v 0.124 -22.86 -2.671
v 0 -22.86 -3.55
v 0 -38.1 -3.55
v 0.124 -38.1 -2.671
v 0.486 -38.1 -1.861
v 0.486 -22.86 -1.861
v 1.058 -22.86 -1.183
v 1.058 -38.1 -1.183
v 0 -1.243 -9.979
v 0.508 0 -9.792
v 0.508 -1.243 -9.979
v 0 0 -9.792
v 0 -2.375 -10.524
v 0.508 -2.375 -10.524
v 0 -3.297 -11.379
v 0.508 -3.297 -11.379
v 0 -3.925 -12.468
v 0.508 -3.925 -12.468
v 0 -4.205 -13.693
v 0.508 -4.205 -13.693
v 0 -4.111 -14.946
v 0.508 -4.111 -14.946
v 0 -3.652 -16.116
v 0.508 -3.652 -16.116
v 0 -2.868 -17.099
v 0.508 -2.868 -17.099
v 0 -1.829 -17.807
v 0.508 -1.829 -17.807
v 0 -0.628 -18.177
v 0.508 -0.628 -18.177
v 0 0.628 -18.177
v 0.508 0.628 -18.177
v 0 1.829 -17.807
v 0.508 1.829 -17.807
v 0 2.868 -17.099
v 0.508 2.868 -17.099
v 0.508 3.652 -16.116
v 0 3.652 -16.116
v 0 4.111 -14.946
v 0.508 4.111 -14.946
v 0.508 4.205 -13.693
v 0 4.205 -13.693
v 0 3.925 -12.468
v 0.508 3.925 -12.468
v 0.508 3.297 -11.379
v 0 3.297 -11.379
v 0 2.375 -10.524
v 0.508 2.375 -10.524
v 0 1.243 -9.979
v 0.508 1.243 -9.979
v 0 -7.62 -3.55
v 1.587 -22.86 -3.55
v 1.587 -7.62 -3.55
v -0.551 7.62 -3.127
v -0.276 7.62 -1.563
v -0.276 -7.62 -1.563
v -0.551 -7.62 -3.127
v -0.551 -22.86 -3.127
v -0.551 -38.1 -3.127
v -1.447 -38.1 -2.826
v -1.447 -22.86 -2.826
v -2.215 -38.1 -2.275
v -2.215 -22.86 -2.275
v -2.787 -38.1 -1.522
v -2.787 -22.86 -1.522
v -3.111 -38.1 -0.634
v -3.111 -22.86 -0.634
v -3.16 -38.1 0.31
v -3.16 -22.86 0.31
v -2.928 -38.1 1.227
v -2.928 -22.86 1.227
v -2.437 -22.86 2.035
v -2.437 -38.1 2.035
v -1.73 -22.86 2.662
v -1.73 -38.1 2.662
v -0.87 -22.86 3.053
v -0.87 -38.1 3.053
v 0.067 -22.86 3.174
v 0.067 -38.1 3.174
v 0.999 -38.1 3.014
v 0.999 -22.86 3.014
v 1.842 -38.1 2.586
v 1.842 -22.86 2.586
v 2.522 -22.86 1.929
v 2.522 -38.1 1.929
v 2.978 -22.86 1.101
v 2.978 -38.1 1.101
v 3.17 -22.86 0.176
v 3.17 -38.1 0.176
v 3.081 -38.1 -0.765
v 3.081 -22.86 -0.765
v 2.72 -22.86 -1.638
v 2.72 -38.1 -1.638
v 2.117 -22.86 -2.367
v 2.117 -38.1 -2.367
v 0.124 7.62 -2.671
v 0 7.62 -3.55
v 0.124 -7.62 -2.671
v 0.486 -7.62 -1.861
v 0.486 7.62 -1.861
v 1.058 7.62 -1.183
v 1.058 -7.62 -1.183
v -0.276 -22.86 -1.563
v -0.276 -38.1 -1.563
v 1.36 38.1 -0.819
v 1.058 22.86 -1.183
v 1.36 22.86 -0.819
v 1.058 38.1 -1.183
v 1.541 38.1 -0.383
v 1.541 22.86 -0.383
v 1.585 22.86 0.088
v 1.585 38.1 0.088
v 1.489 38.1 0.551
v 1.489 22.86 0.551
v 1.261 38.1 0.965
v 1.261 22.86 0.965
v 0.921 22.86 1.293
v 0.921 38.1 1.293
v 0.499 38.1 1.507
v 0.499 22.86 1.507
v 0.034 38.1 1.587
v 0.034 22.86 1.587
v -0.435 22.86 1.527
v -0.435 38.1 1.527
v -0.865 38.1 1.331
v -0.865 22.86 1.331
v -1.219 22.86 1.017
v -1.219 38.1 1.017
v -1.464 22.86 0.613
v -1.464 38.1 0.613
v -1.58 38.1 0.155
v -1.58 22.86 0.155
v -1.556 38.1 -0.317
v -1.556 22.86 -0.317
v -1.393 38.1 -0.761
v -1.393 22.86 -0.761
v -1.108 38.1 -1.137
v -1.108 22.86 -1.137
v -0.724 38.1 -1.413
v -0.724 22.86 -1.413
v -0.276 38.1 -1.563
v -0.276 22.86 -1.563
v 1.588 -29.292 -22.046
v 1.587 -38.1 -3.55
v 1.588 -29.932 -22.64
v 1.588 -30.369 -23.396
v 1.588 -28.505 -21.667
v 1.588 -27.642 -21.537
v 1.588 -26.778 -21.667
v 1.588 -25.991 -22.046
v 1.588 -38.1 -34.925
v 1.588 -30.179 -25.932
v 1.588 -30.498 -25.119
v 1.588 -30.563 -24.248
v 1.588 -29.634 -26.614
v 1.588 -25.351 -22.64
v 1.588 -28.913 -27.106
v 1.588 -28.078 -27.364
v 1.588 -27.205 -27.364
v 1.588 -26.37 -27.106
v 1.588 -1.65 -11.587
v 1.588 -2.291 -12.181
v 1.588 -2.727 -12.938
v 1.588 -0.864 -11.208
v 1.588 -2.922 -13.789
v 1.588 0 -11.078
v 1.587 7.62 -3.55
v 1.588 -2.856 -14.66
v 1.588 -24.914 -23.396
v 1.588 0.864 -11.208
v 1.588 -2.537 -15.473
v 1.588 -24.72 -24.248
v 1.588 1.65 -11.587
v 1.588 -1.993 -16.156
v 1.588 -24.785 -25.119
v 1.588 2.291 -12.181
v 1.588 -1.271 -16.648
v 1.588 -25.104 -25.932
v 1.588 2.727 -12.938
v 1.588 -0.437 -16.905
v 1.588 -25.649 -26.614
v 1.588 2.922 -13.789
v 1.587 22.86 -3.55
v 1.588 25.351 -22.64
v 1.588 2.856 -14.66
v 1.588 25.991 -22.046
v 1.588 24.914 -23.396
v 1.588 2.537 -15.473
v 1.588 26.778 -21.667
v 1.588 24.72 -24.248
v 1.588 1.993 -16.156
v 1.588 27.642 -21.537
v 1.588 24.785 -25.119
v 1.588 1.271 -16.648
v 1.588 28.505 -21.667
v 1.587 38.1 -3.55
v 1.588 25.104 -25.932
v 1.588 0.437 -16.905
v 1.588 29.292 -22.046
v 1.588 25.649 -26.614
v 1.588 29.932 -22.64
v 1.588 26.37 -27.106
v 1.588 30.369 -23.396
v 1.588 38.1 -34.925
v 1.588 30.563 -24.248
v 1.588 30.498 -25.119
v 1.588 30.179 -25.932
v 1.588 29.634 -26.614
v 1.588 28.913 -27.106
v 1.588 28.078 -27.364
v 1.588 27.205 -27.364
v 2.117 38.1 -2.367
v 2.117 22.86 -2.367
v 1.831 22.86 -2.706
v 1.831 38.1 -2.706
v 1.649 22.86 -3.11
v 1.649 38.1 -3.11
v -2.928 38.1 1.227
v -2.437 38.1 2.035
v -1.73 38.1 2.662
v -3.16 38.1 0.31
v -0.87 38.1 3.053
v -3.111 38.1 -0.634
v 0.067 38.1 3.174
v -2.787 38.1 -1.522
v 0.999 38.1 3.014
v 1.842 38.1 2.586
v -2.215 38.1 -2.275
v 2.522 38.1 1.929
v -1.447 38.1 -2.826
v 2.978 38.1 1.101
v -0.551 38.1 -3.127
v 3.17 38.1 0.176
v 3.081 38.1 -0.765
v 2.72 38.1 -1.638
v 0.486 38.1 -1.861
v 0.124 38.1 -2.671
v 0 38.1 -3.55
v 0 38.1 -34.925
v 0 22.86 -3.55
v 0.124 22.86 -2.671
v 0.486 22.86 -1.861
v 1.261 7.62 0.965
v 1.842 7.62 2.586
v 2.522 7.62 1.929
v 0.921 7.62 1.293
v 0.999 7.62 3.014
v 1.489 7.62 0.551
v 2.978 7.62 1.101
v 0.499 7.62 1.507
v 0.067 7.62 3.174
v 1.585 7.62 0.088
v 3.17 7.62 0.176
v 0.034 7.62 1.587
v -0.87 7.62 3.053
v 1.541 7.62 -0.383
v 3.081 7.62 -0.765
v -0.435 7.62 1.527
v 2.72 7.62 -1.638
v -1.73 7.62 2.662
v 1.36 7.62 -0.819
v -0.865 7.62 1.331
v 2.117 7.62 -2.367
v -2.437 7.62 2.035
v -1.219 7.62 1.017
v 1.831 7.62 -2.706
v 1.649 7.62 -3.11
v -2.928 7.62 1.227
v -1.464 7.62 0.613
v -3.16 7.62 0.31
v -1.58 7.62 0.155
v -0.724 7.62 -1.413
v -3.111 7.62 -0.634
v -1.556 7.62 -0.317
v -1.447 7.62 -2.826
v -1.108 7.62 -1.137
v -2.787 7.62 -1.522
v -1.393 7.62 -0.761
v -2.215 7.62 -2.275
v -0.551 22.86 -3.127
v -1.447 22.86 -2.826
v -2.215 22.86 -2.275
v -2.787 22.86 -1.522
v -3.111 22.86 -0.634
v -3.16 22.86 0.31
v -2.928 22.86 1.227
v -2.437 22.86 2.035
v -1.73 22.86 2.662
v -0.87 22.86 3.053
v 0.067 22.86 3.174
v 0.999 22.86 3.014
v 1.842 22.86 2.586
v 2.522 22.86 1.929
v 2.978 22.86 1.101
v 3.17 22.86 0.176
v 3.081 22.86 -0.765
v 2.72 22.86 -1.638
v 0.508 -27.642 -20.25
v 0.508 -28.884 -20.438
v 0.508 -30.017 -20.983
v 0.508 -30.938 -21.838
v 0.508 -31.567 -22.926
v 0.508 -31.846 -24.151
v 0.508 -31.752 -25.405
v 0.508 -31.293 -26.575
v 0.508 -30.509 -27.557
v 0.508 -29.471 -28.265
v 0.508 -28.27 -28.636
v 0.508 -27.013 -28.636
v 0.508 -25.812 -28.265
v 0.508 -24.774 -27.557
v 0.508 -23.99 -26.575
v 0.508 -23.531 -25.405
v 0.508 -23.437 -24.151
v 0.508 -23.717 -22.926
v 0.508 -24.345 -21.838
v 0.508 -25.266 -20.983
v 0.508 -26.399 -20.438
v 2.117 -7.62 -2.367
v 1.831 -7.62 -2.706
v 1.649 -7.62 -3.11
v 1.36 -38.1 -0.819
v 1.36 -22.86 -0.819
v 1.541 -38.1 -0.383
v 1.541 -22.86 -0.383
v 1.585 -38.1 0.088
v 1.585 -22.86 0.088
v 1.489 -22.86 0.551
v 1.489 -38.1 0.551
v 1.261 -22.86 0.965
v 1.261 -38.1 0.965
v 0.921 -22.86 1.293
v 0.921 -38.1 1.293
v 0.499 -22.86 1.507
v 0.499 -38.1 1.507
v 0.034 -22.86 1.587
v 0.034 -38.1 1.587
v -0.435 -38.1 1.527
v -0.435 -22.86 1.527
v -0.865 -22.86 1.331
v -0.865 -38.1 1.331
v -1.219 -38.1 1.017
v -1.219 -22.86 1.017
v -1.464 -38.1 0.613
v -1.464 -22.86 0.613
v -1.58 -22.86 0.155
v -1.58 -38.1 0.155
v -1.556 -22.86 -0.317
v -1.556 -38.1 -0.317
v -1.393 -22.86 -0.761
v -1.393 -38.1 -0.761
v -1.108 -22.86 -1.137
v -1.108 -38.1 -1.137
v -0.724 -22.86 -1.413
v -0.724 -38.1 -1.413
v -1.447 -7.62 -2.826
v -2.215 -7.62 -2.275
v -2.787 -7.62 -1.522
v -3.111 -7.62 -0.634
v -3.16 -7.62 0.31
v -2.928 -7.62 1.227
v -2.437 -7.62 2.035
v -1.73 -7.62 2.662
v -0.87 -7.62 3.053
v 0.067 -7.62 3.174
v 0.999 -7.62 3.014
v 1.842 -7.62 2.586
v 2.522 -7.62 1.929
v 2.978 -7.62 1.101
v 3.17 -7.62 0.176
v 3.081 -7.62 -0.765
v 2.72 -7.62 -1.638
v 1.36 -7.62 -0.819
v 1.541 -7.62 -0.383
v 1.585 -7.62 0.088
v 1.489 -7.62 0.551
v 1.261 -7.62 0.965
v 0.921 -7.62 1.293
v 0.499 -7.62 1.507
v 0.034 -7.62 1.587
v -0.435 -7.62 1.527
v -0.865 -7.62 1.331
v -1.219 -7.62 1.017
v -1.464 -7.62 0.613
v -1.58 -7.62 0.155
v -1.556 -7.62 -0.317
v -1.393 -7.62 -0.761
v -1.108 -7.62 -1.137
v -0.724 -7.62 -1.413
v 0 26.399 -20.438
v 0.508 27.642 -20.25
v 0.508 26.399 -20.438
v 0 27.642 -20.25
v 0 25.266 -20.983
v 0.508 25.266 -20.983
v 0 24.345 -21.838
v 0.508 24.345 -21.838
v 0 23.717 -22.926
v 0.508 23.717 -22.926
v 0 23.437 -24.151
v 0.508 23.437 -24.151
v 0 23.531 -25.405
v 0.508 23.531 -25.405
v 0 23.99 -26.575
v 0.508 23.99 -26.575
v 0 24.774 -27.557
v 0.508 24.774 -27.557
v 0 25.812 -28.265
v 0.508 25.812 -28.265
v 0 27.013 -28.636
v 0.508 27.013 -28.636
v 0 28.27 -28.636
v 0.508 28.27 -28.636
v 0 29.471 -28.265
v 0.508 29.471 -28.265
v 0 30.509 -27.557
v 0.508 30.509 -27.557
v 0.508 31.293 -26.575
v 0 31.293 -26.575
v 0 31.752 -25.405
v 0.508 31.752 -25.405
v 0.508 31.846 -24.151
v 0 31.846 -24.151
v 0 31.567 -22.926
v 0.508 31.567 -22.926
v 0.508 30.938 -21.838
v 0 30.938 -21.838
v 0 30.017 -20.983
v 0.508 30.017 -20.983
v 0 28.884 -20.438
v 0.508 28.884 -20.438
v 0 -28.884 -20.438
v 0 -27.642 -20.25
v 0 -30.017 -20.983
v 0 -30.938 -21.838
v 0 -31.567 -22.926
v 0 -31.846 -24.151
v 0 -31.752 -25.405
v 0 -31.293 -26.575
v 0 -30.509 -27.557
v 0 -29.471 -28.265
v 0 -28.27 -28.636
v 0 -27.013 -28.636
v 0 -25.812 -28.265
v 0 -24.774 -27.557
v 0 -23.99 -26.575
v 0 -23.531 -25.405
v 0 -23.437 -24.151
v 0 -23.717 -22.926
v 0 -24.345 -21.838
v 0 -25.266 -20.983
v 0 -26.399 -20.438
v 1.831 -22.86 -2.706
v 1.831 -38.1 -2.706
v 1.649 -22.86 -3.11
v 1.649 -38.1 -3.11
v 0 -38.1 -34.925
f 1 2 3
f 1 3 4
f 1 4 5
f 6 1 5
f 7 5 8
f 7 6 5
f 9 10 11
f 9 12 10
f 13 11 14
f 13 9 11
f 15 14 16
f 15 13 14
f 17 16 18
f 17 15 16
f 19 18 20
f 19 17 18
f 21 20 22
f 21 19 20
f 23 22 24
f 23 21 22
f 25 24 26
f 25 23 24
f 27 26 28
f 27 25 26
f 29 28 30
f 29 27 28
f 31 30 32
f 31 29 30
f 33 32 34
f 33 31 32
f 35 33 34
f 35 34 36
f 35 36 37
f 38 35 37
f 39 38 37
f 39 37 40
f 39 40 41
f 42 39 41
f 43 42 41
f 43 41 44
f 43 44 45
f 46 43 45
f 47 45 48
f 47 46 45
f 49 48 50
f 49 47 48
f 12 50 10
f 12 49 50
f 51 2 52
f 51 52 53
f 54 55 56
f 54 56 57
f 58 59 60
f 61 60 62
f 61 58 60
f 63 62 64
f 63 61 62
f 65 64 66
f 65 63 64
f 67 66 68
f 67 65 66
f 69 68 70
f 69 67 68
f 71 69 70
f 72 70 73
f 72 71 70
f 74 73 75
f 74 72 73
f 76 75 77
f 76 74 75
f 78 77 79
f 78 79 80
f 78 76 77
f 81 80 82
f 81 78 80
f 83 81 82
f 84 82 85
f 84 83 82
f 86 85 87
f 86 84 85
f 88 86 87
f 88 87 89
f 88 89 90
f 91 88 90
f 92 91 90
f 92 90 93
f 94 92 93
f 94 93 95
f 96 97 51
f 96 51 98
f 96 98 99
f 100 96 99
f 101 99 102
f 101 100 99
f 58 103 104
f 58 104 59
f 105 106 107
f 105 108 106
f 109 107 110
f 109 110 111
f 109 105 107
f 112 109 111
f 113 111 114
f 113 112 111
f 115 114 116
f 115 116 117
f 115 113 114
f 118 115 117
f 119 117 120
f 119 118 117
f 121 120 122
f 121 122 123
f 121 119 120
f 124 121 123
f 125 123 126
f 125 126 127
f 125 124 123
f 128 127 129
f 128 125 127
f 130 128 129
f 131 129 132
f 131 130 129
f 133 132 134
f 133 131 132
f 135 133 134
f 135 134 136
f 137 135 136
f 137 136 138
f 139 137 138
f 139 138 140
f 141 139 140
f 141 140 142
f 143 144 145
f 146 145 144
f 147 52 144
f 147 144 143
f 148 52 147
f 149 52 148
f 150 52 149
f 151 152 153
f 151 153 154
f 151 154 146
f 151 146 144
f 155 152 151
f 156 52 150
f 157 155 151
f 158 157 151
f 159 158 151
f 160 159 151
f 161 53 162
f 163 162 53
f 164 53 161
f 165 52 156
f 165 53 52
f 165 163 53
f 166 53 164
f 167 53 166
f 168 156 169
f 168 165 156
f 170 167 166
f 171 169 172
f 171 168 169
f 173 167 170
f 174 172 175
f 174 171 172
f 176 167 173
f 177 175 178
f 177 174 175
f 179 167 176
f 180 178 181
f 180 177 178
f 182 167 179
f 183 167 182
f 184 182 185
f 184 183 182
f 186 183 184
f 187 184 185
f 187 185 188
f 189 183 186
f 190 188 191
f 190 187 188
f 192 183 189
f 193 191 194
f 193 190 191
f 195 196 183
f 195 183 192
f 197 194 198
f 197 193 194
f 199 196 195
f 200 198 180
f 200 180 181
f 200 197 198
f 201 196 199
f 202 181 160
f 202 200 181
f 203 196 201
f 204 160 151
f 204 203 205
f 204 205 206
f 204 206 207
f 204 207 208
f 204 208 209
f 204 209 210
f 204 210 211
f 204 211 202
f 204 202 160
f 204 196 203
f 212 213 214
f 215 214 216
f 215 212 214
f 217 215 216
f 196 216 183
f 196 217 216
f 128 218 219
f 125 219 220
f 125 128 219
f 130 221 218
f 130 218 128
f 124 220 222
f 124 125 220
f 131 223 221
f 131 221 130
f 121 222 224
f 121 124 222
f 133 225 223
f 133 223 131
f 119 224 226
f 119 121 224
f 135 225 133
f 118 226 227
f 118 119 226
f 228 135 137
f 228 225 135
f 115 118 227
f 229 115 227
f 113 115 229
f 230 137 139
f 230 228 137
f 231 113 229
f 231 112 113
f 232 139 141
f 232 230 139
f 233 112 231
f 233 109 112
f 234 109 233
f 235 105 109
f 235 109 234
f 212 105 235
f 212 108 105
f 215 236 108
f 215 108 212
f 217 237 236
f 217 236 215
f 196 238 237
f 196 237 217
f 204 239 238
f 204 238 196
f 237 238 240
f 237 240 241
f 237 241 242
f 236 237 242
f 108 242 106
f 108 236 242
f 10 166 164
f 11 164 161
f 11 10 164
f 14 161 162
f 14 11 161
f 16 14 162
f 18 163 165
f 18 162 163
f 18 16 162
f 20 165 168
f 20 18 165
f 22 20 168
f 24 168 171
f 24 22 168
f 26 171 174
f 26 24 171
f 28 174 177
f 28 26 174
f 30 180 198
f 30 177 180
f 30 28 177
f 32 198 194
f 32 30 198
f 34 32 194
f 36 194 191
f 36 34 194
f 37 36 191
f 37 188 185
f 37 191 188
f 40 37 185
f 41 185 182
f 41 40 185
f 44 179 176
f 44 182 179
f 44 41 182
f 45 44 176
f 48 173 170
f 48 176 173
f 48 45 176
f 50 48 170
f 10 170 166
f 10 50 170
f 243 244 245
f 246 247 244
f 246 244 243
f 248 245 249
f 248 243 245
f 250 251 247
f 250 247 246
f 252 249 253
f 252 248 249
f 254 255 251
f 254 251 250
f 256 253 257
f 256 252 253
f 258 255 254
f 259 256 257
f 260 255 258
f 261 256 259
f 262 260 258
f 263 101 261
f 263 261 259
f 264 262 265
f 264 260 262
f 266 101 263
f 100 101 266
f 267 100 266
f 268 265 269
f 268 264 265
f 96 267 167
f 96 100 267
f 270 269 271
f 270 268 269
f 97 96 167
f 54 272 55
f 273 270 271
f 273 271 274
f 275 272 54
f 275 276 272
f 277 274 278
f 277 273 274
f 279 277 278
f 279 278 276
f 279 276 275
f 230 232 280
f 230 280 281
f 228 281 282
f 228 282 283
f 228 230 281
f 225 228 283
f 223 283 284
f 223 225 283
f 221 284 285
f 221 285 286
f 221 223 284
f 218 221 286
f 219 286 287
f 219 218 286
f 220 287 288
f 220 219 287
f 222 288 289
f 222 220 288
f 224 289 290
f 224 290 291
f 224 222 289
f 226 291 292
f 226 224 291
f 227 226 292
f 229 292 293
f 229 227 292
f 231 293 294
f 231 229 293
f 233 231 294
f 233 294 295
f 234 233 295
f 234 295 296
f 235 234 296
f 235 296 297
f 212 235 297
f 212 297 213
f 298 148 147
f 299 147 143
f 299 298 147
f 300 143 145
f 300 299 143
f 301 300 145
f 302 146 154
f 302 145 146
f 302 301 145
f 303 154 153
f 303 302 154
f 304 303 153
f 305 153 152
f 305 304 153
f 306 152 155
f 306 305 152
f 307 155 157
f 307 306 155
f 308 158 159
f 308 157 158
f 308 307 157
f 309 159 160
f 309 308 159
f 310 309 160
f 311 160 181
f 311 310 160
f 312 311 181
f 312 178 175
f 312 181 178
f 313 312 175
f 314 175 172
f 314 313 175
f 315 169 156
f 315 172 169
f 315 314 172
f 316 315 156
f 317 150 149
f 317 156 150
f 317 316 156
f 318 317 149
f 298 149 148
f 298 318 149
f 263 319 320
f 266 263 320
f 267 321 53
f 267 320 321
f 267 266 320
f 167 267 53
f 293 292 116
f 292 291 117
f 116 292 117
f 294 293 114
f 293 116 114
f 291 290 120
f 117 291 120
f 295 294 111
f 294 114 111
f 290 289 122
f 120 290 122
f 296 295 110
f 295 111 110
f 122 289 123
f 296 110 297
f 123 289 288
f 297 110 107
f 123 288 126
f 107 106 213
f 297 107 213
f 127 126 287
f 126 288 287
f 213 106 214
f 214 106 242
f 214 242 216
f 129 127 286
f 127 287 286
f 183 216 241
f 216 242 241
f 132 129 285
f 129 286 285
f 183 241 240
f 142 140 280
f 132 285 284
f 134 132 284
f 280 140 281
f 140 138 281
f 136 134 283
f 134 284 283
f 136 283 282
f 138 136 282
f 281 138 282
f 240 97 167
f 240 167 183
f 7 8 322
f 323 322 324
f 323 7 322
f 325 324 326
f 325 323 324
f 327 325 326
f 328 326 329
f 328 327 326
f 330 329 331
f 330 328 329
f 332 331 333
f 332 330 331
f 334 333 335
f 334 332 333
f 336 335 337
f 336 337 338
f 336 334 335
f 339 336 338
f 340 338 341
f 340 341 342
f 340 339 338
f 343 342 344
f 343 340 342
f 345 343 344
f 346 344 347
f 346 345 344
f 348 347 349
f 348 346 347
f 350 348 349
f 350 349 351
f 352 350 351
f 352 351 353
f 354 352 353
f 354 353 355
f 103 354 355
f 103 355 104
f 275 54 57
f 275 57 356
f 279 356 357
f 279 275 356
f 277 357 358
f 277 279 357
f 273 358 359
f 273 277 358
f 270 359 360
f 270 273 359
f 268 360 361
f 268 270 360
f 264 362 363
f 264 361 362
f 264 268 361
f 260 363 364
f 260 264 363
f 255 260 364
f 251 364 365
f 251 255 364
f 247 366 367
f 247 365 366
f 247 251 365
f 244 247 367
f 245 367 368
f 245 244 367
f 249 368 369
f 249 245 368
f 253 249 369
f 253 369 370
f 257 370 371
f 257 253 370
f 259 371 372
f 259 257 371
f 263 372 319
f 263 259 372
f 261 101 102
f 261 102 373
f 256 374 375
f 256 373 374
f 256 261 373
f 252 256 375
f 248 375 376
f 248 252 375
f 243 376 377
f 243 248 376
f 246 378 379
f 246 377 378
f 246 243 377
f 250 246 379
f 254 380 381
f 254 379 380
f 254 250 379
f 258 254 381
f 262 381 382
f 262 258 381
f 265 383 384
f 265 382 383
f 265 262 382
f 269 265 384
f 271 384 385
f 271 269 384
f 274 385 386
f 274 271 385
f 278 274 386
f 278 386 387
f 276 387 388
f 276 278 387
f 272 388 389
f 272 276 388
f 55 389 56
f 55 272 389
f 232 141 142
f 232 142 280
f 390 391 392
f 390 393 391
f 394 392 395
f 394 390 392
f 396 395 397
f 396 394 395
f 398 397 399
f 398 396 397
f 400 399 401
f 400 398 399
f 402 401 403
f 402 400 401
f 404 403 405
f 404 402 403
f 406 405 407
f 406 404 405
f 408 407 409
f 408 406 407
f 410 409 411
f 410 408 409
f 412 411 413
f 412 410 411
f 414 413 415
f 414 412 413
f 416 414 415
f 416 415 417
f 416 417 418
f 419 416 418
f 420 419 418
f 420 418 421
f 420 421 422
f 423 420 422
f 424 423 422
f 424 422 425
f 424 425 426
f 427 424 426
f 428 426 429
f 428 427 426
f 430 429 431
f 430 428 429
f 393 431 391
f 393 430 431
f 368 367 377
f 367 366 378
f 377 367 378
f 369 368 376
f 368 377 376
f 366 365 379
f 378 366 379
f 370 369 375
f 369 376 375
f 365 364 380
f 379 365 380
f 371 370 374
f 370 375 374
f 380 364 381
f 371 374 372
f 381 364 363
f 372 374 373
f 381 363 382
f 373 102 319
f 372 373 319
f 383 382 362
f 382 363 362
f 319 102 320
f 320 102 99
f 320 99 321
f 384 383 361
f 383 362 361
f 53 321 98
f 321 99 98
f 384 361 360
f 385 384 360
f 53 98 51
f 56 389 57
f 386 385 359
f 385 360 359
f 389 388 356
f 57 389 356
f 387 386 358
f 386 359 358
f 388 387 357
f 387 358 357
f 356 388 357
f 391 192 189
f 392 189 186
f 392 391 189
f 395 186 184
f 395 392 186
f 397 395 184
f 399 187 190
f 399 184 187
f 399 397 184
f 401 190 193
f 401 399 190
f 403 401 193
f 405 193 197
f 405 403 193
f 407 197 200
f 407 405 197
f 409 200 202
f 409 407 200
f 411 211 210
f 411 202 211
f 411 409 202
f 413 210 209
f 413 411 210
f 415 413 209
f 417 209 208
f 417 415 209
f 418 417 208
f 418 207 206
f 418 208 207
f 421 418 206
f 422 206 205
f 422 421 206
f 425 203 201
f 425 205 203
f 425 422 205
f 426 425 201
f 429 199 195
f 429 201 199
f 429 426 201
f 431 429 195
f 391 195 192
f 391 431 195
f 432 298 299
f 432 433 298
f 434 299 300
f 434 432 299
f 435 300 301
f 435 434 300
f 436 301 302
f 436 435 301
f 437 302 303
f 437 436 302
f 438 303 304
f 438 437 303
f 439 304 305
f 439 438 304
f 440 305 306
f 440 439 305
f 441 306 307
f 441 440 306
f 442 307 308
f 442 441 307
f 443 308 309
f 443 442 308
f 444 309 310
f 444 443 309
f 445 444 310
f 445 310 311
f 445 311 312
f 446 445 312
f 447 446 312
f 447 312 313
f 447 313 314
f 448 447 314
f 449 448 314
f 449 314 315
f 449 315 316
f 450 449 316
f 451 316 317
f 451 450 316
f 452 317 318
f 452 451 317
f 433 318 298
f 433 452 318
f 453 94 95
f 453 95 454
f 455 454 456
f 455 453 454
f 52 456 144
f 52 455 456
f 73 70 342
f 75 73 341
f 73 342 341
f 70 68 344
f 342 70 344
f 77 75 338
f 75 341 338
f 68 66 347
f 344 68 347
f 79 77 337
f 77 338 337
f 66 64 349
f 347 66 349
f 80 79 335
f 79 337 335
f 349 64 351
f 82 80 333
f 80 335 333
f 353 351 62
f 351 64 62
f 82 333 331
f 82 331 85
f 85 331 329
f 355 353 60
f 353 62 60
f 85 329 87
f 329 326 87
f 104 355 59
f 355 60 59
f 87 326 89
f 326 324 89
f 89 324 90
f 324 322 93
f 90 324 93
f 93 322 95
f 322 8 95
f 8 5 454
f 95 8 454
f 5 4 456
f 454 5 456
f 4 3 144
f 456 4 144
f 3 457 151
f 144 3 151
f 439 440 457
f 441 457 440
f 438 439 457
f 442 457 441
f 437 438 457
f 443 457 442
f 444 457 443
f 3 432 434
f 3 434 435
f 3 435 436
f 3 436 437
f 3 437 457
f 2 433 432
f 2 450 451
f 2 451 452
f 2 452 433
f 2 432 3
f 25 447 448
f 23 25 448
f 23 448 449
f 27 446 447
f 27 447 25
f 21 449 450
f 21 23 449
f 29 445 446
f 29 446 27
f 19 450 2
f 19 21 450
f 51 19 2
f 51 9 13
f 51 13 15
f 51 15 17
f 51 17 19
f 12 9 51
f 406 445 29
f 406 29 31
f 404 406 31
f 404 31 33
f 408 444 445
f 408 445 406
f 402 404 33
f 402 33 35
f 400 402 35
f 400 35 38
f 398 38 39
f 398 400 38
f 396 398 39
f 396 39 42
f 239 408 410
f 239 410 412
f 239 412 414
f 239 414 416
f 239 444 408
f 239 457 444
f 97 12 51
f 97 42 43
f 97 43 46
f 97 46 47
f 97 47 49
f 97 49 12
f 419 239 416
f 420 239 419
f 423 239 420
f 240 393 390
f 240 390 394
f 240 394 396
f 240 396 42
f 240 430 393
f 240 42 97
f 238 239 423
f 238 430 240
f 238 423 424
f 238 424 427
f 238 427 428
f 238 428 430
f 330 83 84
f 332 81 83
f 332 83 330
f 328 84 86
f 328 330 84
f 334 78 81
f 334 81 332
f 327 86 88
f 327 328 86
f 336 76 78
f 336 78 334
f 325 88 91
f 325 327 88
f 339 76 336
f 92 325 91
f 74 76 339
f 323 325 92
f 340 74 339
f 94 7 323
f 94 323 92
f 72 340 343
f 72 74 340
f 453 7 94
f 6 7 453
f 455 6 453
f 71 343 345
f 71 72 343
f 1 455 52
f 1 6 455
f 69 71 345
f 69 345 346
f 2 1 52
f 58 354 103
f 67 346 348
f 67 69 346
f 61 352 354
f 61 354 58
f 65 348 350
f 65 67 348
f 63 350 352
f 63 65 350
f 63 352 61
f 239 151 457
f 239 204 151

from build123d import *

# Parameters (mm, degrees)
BOSS_EXTRUDE1_DEPTH                       = 38.1
SKETCH3_W                                 = 6.724757914
SKETCH3_H                                 = 15.24
CUT_EXTRUDE1_DEPTH                        = 4.175
CUT_EXTRUDE1_DEPTH_BACK                   = 4.175
CSK_FOR_8_FLAT_HEAD_MACHINE_SCREW_2_COUNT = 2
CSK_FOR_8_FLAT_HEAD_MACHINE_SCREW_2_PITCH = 29.553945574
CSK_FOR_8_FLAT_HEAD_MACHINE_SCREW_3_COUNT = 2
CSK_FOR_8_FLAT_HEAD_MACHINE_SCREW_3_PITCH = 55.283171943


with BuildPart() as part:
    # Sketch2 → Boss-Extrude1 (new body, symmetric)
    with BuildSketch(Plane(origin=(0, 0, 0), x_dir=(1, 0, 0), z_dir=(0, 1, 0))):
        with BuildLine():
            Line((1.5875, 34.925), (0, 34.925))
            Line((0, 34.925), (0, 3.549757914))
            ThreePointArc((0, 3.549757914), (0.2766348, 2.253569592), (1.058333333, 1.183252638))
            ThreePointArc((1.058333333, 1.183252638), (-0.435047689, -1.526725175), (-0.275666482, 1.563382308))
            Line((-0.275666482, 1.563382308), (-0.551332964, 3.126764616))
            ThreePointArc((-0.551332964, 3.126764616), (-0.870095378, -3.053450349), (2.116666667, 2.366505276))
            ThreePointArc((2.116666667, 2.366505276), (1.7258174, 2.901663753), (1.5875, 3.549757914))
            Line((1.5875, 3.549757914), (1.5875, 34.925))
        make_face()
    extrude(amount=BOSS_EXTRUDE1_DEPTH, both=True)

    # Sketch3 → Cut-Extrude1 (cut, two sides)
    with BuildSketch(Plane(origin=(0, 0, 0), x_dir=(0, 0, -1), z_dir=(1, 0, 0))) as cut_extrude1_sk:
        with Locations((0.187378957, 15.24)):
            Rectangle(SKETCH3_W, SKETCH3_H)
        with Locations((0.187378957, -15.24)):
            Rectangle(SKETCH3_W, SKETCH3_H)
    extrude(amount=CUT_EXTRUDE1_DEPTH, mode=Mode.SUBTRACT)
    extrude(cut_extrude1_sk.sketch, amount=-CUT_EXTRUDE1_DEPTH_BACK, mode=Mode.SUBTRACT)

    # Sketch4 → CSK for #8 Flat Head Machine Screw (100)1 (revolve, cut)
    with BuildSketch(Plane(origin=(0, -27.641585971, -24.466585971), x_dir=(0, 0, 1), z_dir=(0, 1, 0))):
        Polygon((0, 0), (0, 3.175), (2.2479, 3.175), (2.2479, 2.159767624), (4.2164, 0.508), (4.2164, 0), align=None)
    csk_for_8_flat_head_machine_screw_100 = revolve(axis=Axis((-6.35, -27.641585971, -24.466585971), (1, 0, 0)), mode=Mode.SUBTRACT)

    # CSK for _8 Flat Head Machine Screw _ 2: CSK for #8 Flat Head Machine Screw (100)1 ×2
    with Locations(*[Vector(0, 0.935292579, 0.35387539) * (i * CSK_FOR_8_FLAT_HEAD_MACHINE_SCREW_2_PITCH) for i in range(1, CSK_FOR_8_FLAT_HEAD_MACHINE_SCREW_2_COUNT)]):
        add(csk_for_8_flat_head_machine_screw_100, mode=Mode.SUBTRACT)

    # CSK for _8 Flat Head Machine Screw _ 3: CSK for #8 Flat Head Machine Screw (100)1 ×2
    with Locations(*[(0, i * CSK_FOR_8_FLAT_HEAD_MACHINE_SCREW_3_PITCH, 0) for i in range(1, CSK_FOR_8_FLAT_HEAD_MACHINE_SCREW_3_COUNT)]):
        add(csk_for_8_flat_head_machine_screw_100, mode=Mode.SUBTRACT)


solid = part.part
